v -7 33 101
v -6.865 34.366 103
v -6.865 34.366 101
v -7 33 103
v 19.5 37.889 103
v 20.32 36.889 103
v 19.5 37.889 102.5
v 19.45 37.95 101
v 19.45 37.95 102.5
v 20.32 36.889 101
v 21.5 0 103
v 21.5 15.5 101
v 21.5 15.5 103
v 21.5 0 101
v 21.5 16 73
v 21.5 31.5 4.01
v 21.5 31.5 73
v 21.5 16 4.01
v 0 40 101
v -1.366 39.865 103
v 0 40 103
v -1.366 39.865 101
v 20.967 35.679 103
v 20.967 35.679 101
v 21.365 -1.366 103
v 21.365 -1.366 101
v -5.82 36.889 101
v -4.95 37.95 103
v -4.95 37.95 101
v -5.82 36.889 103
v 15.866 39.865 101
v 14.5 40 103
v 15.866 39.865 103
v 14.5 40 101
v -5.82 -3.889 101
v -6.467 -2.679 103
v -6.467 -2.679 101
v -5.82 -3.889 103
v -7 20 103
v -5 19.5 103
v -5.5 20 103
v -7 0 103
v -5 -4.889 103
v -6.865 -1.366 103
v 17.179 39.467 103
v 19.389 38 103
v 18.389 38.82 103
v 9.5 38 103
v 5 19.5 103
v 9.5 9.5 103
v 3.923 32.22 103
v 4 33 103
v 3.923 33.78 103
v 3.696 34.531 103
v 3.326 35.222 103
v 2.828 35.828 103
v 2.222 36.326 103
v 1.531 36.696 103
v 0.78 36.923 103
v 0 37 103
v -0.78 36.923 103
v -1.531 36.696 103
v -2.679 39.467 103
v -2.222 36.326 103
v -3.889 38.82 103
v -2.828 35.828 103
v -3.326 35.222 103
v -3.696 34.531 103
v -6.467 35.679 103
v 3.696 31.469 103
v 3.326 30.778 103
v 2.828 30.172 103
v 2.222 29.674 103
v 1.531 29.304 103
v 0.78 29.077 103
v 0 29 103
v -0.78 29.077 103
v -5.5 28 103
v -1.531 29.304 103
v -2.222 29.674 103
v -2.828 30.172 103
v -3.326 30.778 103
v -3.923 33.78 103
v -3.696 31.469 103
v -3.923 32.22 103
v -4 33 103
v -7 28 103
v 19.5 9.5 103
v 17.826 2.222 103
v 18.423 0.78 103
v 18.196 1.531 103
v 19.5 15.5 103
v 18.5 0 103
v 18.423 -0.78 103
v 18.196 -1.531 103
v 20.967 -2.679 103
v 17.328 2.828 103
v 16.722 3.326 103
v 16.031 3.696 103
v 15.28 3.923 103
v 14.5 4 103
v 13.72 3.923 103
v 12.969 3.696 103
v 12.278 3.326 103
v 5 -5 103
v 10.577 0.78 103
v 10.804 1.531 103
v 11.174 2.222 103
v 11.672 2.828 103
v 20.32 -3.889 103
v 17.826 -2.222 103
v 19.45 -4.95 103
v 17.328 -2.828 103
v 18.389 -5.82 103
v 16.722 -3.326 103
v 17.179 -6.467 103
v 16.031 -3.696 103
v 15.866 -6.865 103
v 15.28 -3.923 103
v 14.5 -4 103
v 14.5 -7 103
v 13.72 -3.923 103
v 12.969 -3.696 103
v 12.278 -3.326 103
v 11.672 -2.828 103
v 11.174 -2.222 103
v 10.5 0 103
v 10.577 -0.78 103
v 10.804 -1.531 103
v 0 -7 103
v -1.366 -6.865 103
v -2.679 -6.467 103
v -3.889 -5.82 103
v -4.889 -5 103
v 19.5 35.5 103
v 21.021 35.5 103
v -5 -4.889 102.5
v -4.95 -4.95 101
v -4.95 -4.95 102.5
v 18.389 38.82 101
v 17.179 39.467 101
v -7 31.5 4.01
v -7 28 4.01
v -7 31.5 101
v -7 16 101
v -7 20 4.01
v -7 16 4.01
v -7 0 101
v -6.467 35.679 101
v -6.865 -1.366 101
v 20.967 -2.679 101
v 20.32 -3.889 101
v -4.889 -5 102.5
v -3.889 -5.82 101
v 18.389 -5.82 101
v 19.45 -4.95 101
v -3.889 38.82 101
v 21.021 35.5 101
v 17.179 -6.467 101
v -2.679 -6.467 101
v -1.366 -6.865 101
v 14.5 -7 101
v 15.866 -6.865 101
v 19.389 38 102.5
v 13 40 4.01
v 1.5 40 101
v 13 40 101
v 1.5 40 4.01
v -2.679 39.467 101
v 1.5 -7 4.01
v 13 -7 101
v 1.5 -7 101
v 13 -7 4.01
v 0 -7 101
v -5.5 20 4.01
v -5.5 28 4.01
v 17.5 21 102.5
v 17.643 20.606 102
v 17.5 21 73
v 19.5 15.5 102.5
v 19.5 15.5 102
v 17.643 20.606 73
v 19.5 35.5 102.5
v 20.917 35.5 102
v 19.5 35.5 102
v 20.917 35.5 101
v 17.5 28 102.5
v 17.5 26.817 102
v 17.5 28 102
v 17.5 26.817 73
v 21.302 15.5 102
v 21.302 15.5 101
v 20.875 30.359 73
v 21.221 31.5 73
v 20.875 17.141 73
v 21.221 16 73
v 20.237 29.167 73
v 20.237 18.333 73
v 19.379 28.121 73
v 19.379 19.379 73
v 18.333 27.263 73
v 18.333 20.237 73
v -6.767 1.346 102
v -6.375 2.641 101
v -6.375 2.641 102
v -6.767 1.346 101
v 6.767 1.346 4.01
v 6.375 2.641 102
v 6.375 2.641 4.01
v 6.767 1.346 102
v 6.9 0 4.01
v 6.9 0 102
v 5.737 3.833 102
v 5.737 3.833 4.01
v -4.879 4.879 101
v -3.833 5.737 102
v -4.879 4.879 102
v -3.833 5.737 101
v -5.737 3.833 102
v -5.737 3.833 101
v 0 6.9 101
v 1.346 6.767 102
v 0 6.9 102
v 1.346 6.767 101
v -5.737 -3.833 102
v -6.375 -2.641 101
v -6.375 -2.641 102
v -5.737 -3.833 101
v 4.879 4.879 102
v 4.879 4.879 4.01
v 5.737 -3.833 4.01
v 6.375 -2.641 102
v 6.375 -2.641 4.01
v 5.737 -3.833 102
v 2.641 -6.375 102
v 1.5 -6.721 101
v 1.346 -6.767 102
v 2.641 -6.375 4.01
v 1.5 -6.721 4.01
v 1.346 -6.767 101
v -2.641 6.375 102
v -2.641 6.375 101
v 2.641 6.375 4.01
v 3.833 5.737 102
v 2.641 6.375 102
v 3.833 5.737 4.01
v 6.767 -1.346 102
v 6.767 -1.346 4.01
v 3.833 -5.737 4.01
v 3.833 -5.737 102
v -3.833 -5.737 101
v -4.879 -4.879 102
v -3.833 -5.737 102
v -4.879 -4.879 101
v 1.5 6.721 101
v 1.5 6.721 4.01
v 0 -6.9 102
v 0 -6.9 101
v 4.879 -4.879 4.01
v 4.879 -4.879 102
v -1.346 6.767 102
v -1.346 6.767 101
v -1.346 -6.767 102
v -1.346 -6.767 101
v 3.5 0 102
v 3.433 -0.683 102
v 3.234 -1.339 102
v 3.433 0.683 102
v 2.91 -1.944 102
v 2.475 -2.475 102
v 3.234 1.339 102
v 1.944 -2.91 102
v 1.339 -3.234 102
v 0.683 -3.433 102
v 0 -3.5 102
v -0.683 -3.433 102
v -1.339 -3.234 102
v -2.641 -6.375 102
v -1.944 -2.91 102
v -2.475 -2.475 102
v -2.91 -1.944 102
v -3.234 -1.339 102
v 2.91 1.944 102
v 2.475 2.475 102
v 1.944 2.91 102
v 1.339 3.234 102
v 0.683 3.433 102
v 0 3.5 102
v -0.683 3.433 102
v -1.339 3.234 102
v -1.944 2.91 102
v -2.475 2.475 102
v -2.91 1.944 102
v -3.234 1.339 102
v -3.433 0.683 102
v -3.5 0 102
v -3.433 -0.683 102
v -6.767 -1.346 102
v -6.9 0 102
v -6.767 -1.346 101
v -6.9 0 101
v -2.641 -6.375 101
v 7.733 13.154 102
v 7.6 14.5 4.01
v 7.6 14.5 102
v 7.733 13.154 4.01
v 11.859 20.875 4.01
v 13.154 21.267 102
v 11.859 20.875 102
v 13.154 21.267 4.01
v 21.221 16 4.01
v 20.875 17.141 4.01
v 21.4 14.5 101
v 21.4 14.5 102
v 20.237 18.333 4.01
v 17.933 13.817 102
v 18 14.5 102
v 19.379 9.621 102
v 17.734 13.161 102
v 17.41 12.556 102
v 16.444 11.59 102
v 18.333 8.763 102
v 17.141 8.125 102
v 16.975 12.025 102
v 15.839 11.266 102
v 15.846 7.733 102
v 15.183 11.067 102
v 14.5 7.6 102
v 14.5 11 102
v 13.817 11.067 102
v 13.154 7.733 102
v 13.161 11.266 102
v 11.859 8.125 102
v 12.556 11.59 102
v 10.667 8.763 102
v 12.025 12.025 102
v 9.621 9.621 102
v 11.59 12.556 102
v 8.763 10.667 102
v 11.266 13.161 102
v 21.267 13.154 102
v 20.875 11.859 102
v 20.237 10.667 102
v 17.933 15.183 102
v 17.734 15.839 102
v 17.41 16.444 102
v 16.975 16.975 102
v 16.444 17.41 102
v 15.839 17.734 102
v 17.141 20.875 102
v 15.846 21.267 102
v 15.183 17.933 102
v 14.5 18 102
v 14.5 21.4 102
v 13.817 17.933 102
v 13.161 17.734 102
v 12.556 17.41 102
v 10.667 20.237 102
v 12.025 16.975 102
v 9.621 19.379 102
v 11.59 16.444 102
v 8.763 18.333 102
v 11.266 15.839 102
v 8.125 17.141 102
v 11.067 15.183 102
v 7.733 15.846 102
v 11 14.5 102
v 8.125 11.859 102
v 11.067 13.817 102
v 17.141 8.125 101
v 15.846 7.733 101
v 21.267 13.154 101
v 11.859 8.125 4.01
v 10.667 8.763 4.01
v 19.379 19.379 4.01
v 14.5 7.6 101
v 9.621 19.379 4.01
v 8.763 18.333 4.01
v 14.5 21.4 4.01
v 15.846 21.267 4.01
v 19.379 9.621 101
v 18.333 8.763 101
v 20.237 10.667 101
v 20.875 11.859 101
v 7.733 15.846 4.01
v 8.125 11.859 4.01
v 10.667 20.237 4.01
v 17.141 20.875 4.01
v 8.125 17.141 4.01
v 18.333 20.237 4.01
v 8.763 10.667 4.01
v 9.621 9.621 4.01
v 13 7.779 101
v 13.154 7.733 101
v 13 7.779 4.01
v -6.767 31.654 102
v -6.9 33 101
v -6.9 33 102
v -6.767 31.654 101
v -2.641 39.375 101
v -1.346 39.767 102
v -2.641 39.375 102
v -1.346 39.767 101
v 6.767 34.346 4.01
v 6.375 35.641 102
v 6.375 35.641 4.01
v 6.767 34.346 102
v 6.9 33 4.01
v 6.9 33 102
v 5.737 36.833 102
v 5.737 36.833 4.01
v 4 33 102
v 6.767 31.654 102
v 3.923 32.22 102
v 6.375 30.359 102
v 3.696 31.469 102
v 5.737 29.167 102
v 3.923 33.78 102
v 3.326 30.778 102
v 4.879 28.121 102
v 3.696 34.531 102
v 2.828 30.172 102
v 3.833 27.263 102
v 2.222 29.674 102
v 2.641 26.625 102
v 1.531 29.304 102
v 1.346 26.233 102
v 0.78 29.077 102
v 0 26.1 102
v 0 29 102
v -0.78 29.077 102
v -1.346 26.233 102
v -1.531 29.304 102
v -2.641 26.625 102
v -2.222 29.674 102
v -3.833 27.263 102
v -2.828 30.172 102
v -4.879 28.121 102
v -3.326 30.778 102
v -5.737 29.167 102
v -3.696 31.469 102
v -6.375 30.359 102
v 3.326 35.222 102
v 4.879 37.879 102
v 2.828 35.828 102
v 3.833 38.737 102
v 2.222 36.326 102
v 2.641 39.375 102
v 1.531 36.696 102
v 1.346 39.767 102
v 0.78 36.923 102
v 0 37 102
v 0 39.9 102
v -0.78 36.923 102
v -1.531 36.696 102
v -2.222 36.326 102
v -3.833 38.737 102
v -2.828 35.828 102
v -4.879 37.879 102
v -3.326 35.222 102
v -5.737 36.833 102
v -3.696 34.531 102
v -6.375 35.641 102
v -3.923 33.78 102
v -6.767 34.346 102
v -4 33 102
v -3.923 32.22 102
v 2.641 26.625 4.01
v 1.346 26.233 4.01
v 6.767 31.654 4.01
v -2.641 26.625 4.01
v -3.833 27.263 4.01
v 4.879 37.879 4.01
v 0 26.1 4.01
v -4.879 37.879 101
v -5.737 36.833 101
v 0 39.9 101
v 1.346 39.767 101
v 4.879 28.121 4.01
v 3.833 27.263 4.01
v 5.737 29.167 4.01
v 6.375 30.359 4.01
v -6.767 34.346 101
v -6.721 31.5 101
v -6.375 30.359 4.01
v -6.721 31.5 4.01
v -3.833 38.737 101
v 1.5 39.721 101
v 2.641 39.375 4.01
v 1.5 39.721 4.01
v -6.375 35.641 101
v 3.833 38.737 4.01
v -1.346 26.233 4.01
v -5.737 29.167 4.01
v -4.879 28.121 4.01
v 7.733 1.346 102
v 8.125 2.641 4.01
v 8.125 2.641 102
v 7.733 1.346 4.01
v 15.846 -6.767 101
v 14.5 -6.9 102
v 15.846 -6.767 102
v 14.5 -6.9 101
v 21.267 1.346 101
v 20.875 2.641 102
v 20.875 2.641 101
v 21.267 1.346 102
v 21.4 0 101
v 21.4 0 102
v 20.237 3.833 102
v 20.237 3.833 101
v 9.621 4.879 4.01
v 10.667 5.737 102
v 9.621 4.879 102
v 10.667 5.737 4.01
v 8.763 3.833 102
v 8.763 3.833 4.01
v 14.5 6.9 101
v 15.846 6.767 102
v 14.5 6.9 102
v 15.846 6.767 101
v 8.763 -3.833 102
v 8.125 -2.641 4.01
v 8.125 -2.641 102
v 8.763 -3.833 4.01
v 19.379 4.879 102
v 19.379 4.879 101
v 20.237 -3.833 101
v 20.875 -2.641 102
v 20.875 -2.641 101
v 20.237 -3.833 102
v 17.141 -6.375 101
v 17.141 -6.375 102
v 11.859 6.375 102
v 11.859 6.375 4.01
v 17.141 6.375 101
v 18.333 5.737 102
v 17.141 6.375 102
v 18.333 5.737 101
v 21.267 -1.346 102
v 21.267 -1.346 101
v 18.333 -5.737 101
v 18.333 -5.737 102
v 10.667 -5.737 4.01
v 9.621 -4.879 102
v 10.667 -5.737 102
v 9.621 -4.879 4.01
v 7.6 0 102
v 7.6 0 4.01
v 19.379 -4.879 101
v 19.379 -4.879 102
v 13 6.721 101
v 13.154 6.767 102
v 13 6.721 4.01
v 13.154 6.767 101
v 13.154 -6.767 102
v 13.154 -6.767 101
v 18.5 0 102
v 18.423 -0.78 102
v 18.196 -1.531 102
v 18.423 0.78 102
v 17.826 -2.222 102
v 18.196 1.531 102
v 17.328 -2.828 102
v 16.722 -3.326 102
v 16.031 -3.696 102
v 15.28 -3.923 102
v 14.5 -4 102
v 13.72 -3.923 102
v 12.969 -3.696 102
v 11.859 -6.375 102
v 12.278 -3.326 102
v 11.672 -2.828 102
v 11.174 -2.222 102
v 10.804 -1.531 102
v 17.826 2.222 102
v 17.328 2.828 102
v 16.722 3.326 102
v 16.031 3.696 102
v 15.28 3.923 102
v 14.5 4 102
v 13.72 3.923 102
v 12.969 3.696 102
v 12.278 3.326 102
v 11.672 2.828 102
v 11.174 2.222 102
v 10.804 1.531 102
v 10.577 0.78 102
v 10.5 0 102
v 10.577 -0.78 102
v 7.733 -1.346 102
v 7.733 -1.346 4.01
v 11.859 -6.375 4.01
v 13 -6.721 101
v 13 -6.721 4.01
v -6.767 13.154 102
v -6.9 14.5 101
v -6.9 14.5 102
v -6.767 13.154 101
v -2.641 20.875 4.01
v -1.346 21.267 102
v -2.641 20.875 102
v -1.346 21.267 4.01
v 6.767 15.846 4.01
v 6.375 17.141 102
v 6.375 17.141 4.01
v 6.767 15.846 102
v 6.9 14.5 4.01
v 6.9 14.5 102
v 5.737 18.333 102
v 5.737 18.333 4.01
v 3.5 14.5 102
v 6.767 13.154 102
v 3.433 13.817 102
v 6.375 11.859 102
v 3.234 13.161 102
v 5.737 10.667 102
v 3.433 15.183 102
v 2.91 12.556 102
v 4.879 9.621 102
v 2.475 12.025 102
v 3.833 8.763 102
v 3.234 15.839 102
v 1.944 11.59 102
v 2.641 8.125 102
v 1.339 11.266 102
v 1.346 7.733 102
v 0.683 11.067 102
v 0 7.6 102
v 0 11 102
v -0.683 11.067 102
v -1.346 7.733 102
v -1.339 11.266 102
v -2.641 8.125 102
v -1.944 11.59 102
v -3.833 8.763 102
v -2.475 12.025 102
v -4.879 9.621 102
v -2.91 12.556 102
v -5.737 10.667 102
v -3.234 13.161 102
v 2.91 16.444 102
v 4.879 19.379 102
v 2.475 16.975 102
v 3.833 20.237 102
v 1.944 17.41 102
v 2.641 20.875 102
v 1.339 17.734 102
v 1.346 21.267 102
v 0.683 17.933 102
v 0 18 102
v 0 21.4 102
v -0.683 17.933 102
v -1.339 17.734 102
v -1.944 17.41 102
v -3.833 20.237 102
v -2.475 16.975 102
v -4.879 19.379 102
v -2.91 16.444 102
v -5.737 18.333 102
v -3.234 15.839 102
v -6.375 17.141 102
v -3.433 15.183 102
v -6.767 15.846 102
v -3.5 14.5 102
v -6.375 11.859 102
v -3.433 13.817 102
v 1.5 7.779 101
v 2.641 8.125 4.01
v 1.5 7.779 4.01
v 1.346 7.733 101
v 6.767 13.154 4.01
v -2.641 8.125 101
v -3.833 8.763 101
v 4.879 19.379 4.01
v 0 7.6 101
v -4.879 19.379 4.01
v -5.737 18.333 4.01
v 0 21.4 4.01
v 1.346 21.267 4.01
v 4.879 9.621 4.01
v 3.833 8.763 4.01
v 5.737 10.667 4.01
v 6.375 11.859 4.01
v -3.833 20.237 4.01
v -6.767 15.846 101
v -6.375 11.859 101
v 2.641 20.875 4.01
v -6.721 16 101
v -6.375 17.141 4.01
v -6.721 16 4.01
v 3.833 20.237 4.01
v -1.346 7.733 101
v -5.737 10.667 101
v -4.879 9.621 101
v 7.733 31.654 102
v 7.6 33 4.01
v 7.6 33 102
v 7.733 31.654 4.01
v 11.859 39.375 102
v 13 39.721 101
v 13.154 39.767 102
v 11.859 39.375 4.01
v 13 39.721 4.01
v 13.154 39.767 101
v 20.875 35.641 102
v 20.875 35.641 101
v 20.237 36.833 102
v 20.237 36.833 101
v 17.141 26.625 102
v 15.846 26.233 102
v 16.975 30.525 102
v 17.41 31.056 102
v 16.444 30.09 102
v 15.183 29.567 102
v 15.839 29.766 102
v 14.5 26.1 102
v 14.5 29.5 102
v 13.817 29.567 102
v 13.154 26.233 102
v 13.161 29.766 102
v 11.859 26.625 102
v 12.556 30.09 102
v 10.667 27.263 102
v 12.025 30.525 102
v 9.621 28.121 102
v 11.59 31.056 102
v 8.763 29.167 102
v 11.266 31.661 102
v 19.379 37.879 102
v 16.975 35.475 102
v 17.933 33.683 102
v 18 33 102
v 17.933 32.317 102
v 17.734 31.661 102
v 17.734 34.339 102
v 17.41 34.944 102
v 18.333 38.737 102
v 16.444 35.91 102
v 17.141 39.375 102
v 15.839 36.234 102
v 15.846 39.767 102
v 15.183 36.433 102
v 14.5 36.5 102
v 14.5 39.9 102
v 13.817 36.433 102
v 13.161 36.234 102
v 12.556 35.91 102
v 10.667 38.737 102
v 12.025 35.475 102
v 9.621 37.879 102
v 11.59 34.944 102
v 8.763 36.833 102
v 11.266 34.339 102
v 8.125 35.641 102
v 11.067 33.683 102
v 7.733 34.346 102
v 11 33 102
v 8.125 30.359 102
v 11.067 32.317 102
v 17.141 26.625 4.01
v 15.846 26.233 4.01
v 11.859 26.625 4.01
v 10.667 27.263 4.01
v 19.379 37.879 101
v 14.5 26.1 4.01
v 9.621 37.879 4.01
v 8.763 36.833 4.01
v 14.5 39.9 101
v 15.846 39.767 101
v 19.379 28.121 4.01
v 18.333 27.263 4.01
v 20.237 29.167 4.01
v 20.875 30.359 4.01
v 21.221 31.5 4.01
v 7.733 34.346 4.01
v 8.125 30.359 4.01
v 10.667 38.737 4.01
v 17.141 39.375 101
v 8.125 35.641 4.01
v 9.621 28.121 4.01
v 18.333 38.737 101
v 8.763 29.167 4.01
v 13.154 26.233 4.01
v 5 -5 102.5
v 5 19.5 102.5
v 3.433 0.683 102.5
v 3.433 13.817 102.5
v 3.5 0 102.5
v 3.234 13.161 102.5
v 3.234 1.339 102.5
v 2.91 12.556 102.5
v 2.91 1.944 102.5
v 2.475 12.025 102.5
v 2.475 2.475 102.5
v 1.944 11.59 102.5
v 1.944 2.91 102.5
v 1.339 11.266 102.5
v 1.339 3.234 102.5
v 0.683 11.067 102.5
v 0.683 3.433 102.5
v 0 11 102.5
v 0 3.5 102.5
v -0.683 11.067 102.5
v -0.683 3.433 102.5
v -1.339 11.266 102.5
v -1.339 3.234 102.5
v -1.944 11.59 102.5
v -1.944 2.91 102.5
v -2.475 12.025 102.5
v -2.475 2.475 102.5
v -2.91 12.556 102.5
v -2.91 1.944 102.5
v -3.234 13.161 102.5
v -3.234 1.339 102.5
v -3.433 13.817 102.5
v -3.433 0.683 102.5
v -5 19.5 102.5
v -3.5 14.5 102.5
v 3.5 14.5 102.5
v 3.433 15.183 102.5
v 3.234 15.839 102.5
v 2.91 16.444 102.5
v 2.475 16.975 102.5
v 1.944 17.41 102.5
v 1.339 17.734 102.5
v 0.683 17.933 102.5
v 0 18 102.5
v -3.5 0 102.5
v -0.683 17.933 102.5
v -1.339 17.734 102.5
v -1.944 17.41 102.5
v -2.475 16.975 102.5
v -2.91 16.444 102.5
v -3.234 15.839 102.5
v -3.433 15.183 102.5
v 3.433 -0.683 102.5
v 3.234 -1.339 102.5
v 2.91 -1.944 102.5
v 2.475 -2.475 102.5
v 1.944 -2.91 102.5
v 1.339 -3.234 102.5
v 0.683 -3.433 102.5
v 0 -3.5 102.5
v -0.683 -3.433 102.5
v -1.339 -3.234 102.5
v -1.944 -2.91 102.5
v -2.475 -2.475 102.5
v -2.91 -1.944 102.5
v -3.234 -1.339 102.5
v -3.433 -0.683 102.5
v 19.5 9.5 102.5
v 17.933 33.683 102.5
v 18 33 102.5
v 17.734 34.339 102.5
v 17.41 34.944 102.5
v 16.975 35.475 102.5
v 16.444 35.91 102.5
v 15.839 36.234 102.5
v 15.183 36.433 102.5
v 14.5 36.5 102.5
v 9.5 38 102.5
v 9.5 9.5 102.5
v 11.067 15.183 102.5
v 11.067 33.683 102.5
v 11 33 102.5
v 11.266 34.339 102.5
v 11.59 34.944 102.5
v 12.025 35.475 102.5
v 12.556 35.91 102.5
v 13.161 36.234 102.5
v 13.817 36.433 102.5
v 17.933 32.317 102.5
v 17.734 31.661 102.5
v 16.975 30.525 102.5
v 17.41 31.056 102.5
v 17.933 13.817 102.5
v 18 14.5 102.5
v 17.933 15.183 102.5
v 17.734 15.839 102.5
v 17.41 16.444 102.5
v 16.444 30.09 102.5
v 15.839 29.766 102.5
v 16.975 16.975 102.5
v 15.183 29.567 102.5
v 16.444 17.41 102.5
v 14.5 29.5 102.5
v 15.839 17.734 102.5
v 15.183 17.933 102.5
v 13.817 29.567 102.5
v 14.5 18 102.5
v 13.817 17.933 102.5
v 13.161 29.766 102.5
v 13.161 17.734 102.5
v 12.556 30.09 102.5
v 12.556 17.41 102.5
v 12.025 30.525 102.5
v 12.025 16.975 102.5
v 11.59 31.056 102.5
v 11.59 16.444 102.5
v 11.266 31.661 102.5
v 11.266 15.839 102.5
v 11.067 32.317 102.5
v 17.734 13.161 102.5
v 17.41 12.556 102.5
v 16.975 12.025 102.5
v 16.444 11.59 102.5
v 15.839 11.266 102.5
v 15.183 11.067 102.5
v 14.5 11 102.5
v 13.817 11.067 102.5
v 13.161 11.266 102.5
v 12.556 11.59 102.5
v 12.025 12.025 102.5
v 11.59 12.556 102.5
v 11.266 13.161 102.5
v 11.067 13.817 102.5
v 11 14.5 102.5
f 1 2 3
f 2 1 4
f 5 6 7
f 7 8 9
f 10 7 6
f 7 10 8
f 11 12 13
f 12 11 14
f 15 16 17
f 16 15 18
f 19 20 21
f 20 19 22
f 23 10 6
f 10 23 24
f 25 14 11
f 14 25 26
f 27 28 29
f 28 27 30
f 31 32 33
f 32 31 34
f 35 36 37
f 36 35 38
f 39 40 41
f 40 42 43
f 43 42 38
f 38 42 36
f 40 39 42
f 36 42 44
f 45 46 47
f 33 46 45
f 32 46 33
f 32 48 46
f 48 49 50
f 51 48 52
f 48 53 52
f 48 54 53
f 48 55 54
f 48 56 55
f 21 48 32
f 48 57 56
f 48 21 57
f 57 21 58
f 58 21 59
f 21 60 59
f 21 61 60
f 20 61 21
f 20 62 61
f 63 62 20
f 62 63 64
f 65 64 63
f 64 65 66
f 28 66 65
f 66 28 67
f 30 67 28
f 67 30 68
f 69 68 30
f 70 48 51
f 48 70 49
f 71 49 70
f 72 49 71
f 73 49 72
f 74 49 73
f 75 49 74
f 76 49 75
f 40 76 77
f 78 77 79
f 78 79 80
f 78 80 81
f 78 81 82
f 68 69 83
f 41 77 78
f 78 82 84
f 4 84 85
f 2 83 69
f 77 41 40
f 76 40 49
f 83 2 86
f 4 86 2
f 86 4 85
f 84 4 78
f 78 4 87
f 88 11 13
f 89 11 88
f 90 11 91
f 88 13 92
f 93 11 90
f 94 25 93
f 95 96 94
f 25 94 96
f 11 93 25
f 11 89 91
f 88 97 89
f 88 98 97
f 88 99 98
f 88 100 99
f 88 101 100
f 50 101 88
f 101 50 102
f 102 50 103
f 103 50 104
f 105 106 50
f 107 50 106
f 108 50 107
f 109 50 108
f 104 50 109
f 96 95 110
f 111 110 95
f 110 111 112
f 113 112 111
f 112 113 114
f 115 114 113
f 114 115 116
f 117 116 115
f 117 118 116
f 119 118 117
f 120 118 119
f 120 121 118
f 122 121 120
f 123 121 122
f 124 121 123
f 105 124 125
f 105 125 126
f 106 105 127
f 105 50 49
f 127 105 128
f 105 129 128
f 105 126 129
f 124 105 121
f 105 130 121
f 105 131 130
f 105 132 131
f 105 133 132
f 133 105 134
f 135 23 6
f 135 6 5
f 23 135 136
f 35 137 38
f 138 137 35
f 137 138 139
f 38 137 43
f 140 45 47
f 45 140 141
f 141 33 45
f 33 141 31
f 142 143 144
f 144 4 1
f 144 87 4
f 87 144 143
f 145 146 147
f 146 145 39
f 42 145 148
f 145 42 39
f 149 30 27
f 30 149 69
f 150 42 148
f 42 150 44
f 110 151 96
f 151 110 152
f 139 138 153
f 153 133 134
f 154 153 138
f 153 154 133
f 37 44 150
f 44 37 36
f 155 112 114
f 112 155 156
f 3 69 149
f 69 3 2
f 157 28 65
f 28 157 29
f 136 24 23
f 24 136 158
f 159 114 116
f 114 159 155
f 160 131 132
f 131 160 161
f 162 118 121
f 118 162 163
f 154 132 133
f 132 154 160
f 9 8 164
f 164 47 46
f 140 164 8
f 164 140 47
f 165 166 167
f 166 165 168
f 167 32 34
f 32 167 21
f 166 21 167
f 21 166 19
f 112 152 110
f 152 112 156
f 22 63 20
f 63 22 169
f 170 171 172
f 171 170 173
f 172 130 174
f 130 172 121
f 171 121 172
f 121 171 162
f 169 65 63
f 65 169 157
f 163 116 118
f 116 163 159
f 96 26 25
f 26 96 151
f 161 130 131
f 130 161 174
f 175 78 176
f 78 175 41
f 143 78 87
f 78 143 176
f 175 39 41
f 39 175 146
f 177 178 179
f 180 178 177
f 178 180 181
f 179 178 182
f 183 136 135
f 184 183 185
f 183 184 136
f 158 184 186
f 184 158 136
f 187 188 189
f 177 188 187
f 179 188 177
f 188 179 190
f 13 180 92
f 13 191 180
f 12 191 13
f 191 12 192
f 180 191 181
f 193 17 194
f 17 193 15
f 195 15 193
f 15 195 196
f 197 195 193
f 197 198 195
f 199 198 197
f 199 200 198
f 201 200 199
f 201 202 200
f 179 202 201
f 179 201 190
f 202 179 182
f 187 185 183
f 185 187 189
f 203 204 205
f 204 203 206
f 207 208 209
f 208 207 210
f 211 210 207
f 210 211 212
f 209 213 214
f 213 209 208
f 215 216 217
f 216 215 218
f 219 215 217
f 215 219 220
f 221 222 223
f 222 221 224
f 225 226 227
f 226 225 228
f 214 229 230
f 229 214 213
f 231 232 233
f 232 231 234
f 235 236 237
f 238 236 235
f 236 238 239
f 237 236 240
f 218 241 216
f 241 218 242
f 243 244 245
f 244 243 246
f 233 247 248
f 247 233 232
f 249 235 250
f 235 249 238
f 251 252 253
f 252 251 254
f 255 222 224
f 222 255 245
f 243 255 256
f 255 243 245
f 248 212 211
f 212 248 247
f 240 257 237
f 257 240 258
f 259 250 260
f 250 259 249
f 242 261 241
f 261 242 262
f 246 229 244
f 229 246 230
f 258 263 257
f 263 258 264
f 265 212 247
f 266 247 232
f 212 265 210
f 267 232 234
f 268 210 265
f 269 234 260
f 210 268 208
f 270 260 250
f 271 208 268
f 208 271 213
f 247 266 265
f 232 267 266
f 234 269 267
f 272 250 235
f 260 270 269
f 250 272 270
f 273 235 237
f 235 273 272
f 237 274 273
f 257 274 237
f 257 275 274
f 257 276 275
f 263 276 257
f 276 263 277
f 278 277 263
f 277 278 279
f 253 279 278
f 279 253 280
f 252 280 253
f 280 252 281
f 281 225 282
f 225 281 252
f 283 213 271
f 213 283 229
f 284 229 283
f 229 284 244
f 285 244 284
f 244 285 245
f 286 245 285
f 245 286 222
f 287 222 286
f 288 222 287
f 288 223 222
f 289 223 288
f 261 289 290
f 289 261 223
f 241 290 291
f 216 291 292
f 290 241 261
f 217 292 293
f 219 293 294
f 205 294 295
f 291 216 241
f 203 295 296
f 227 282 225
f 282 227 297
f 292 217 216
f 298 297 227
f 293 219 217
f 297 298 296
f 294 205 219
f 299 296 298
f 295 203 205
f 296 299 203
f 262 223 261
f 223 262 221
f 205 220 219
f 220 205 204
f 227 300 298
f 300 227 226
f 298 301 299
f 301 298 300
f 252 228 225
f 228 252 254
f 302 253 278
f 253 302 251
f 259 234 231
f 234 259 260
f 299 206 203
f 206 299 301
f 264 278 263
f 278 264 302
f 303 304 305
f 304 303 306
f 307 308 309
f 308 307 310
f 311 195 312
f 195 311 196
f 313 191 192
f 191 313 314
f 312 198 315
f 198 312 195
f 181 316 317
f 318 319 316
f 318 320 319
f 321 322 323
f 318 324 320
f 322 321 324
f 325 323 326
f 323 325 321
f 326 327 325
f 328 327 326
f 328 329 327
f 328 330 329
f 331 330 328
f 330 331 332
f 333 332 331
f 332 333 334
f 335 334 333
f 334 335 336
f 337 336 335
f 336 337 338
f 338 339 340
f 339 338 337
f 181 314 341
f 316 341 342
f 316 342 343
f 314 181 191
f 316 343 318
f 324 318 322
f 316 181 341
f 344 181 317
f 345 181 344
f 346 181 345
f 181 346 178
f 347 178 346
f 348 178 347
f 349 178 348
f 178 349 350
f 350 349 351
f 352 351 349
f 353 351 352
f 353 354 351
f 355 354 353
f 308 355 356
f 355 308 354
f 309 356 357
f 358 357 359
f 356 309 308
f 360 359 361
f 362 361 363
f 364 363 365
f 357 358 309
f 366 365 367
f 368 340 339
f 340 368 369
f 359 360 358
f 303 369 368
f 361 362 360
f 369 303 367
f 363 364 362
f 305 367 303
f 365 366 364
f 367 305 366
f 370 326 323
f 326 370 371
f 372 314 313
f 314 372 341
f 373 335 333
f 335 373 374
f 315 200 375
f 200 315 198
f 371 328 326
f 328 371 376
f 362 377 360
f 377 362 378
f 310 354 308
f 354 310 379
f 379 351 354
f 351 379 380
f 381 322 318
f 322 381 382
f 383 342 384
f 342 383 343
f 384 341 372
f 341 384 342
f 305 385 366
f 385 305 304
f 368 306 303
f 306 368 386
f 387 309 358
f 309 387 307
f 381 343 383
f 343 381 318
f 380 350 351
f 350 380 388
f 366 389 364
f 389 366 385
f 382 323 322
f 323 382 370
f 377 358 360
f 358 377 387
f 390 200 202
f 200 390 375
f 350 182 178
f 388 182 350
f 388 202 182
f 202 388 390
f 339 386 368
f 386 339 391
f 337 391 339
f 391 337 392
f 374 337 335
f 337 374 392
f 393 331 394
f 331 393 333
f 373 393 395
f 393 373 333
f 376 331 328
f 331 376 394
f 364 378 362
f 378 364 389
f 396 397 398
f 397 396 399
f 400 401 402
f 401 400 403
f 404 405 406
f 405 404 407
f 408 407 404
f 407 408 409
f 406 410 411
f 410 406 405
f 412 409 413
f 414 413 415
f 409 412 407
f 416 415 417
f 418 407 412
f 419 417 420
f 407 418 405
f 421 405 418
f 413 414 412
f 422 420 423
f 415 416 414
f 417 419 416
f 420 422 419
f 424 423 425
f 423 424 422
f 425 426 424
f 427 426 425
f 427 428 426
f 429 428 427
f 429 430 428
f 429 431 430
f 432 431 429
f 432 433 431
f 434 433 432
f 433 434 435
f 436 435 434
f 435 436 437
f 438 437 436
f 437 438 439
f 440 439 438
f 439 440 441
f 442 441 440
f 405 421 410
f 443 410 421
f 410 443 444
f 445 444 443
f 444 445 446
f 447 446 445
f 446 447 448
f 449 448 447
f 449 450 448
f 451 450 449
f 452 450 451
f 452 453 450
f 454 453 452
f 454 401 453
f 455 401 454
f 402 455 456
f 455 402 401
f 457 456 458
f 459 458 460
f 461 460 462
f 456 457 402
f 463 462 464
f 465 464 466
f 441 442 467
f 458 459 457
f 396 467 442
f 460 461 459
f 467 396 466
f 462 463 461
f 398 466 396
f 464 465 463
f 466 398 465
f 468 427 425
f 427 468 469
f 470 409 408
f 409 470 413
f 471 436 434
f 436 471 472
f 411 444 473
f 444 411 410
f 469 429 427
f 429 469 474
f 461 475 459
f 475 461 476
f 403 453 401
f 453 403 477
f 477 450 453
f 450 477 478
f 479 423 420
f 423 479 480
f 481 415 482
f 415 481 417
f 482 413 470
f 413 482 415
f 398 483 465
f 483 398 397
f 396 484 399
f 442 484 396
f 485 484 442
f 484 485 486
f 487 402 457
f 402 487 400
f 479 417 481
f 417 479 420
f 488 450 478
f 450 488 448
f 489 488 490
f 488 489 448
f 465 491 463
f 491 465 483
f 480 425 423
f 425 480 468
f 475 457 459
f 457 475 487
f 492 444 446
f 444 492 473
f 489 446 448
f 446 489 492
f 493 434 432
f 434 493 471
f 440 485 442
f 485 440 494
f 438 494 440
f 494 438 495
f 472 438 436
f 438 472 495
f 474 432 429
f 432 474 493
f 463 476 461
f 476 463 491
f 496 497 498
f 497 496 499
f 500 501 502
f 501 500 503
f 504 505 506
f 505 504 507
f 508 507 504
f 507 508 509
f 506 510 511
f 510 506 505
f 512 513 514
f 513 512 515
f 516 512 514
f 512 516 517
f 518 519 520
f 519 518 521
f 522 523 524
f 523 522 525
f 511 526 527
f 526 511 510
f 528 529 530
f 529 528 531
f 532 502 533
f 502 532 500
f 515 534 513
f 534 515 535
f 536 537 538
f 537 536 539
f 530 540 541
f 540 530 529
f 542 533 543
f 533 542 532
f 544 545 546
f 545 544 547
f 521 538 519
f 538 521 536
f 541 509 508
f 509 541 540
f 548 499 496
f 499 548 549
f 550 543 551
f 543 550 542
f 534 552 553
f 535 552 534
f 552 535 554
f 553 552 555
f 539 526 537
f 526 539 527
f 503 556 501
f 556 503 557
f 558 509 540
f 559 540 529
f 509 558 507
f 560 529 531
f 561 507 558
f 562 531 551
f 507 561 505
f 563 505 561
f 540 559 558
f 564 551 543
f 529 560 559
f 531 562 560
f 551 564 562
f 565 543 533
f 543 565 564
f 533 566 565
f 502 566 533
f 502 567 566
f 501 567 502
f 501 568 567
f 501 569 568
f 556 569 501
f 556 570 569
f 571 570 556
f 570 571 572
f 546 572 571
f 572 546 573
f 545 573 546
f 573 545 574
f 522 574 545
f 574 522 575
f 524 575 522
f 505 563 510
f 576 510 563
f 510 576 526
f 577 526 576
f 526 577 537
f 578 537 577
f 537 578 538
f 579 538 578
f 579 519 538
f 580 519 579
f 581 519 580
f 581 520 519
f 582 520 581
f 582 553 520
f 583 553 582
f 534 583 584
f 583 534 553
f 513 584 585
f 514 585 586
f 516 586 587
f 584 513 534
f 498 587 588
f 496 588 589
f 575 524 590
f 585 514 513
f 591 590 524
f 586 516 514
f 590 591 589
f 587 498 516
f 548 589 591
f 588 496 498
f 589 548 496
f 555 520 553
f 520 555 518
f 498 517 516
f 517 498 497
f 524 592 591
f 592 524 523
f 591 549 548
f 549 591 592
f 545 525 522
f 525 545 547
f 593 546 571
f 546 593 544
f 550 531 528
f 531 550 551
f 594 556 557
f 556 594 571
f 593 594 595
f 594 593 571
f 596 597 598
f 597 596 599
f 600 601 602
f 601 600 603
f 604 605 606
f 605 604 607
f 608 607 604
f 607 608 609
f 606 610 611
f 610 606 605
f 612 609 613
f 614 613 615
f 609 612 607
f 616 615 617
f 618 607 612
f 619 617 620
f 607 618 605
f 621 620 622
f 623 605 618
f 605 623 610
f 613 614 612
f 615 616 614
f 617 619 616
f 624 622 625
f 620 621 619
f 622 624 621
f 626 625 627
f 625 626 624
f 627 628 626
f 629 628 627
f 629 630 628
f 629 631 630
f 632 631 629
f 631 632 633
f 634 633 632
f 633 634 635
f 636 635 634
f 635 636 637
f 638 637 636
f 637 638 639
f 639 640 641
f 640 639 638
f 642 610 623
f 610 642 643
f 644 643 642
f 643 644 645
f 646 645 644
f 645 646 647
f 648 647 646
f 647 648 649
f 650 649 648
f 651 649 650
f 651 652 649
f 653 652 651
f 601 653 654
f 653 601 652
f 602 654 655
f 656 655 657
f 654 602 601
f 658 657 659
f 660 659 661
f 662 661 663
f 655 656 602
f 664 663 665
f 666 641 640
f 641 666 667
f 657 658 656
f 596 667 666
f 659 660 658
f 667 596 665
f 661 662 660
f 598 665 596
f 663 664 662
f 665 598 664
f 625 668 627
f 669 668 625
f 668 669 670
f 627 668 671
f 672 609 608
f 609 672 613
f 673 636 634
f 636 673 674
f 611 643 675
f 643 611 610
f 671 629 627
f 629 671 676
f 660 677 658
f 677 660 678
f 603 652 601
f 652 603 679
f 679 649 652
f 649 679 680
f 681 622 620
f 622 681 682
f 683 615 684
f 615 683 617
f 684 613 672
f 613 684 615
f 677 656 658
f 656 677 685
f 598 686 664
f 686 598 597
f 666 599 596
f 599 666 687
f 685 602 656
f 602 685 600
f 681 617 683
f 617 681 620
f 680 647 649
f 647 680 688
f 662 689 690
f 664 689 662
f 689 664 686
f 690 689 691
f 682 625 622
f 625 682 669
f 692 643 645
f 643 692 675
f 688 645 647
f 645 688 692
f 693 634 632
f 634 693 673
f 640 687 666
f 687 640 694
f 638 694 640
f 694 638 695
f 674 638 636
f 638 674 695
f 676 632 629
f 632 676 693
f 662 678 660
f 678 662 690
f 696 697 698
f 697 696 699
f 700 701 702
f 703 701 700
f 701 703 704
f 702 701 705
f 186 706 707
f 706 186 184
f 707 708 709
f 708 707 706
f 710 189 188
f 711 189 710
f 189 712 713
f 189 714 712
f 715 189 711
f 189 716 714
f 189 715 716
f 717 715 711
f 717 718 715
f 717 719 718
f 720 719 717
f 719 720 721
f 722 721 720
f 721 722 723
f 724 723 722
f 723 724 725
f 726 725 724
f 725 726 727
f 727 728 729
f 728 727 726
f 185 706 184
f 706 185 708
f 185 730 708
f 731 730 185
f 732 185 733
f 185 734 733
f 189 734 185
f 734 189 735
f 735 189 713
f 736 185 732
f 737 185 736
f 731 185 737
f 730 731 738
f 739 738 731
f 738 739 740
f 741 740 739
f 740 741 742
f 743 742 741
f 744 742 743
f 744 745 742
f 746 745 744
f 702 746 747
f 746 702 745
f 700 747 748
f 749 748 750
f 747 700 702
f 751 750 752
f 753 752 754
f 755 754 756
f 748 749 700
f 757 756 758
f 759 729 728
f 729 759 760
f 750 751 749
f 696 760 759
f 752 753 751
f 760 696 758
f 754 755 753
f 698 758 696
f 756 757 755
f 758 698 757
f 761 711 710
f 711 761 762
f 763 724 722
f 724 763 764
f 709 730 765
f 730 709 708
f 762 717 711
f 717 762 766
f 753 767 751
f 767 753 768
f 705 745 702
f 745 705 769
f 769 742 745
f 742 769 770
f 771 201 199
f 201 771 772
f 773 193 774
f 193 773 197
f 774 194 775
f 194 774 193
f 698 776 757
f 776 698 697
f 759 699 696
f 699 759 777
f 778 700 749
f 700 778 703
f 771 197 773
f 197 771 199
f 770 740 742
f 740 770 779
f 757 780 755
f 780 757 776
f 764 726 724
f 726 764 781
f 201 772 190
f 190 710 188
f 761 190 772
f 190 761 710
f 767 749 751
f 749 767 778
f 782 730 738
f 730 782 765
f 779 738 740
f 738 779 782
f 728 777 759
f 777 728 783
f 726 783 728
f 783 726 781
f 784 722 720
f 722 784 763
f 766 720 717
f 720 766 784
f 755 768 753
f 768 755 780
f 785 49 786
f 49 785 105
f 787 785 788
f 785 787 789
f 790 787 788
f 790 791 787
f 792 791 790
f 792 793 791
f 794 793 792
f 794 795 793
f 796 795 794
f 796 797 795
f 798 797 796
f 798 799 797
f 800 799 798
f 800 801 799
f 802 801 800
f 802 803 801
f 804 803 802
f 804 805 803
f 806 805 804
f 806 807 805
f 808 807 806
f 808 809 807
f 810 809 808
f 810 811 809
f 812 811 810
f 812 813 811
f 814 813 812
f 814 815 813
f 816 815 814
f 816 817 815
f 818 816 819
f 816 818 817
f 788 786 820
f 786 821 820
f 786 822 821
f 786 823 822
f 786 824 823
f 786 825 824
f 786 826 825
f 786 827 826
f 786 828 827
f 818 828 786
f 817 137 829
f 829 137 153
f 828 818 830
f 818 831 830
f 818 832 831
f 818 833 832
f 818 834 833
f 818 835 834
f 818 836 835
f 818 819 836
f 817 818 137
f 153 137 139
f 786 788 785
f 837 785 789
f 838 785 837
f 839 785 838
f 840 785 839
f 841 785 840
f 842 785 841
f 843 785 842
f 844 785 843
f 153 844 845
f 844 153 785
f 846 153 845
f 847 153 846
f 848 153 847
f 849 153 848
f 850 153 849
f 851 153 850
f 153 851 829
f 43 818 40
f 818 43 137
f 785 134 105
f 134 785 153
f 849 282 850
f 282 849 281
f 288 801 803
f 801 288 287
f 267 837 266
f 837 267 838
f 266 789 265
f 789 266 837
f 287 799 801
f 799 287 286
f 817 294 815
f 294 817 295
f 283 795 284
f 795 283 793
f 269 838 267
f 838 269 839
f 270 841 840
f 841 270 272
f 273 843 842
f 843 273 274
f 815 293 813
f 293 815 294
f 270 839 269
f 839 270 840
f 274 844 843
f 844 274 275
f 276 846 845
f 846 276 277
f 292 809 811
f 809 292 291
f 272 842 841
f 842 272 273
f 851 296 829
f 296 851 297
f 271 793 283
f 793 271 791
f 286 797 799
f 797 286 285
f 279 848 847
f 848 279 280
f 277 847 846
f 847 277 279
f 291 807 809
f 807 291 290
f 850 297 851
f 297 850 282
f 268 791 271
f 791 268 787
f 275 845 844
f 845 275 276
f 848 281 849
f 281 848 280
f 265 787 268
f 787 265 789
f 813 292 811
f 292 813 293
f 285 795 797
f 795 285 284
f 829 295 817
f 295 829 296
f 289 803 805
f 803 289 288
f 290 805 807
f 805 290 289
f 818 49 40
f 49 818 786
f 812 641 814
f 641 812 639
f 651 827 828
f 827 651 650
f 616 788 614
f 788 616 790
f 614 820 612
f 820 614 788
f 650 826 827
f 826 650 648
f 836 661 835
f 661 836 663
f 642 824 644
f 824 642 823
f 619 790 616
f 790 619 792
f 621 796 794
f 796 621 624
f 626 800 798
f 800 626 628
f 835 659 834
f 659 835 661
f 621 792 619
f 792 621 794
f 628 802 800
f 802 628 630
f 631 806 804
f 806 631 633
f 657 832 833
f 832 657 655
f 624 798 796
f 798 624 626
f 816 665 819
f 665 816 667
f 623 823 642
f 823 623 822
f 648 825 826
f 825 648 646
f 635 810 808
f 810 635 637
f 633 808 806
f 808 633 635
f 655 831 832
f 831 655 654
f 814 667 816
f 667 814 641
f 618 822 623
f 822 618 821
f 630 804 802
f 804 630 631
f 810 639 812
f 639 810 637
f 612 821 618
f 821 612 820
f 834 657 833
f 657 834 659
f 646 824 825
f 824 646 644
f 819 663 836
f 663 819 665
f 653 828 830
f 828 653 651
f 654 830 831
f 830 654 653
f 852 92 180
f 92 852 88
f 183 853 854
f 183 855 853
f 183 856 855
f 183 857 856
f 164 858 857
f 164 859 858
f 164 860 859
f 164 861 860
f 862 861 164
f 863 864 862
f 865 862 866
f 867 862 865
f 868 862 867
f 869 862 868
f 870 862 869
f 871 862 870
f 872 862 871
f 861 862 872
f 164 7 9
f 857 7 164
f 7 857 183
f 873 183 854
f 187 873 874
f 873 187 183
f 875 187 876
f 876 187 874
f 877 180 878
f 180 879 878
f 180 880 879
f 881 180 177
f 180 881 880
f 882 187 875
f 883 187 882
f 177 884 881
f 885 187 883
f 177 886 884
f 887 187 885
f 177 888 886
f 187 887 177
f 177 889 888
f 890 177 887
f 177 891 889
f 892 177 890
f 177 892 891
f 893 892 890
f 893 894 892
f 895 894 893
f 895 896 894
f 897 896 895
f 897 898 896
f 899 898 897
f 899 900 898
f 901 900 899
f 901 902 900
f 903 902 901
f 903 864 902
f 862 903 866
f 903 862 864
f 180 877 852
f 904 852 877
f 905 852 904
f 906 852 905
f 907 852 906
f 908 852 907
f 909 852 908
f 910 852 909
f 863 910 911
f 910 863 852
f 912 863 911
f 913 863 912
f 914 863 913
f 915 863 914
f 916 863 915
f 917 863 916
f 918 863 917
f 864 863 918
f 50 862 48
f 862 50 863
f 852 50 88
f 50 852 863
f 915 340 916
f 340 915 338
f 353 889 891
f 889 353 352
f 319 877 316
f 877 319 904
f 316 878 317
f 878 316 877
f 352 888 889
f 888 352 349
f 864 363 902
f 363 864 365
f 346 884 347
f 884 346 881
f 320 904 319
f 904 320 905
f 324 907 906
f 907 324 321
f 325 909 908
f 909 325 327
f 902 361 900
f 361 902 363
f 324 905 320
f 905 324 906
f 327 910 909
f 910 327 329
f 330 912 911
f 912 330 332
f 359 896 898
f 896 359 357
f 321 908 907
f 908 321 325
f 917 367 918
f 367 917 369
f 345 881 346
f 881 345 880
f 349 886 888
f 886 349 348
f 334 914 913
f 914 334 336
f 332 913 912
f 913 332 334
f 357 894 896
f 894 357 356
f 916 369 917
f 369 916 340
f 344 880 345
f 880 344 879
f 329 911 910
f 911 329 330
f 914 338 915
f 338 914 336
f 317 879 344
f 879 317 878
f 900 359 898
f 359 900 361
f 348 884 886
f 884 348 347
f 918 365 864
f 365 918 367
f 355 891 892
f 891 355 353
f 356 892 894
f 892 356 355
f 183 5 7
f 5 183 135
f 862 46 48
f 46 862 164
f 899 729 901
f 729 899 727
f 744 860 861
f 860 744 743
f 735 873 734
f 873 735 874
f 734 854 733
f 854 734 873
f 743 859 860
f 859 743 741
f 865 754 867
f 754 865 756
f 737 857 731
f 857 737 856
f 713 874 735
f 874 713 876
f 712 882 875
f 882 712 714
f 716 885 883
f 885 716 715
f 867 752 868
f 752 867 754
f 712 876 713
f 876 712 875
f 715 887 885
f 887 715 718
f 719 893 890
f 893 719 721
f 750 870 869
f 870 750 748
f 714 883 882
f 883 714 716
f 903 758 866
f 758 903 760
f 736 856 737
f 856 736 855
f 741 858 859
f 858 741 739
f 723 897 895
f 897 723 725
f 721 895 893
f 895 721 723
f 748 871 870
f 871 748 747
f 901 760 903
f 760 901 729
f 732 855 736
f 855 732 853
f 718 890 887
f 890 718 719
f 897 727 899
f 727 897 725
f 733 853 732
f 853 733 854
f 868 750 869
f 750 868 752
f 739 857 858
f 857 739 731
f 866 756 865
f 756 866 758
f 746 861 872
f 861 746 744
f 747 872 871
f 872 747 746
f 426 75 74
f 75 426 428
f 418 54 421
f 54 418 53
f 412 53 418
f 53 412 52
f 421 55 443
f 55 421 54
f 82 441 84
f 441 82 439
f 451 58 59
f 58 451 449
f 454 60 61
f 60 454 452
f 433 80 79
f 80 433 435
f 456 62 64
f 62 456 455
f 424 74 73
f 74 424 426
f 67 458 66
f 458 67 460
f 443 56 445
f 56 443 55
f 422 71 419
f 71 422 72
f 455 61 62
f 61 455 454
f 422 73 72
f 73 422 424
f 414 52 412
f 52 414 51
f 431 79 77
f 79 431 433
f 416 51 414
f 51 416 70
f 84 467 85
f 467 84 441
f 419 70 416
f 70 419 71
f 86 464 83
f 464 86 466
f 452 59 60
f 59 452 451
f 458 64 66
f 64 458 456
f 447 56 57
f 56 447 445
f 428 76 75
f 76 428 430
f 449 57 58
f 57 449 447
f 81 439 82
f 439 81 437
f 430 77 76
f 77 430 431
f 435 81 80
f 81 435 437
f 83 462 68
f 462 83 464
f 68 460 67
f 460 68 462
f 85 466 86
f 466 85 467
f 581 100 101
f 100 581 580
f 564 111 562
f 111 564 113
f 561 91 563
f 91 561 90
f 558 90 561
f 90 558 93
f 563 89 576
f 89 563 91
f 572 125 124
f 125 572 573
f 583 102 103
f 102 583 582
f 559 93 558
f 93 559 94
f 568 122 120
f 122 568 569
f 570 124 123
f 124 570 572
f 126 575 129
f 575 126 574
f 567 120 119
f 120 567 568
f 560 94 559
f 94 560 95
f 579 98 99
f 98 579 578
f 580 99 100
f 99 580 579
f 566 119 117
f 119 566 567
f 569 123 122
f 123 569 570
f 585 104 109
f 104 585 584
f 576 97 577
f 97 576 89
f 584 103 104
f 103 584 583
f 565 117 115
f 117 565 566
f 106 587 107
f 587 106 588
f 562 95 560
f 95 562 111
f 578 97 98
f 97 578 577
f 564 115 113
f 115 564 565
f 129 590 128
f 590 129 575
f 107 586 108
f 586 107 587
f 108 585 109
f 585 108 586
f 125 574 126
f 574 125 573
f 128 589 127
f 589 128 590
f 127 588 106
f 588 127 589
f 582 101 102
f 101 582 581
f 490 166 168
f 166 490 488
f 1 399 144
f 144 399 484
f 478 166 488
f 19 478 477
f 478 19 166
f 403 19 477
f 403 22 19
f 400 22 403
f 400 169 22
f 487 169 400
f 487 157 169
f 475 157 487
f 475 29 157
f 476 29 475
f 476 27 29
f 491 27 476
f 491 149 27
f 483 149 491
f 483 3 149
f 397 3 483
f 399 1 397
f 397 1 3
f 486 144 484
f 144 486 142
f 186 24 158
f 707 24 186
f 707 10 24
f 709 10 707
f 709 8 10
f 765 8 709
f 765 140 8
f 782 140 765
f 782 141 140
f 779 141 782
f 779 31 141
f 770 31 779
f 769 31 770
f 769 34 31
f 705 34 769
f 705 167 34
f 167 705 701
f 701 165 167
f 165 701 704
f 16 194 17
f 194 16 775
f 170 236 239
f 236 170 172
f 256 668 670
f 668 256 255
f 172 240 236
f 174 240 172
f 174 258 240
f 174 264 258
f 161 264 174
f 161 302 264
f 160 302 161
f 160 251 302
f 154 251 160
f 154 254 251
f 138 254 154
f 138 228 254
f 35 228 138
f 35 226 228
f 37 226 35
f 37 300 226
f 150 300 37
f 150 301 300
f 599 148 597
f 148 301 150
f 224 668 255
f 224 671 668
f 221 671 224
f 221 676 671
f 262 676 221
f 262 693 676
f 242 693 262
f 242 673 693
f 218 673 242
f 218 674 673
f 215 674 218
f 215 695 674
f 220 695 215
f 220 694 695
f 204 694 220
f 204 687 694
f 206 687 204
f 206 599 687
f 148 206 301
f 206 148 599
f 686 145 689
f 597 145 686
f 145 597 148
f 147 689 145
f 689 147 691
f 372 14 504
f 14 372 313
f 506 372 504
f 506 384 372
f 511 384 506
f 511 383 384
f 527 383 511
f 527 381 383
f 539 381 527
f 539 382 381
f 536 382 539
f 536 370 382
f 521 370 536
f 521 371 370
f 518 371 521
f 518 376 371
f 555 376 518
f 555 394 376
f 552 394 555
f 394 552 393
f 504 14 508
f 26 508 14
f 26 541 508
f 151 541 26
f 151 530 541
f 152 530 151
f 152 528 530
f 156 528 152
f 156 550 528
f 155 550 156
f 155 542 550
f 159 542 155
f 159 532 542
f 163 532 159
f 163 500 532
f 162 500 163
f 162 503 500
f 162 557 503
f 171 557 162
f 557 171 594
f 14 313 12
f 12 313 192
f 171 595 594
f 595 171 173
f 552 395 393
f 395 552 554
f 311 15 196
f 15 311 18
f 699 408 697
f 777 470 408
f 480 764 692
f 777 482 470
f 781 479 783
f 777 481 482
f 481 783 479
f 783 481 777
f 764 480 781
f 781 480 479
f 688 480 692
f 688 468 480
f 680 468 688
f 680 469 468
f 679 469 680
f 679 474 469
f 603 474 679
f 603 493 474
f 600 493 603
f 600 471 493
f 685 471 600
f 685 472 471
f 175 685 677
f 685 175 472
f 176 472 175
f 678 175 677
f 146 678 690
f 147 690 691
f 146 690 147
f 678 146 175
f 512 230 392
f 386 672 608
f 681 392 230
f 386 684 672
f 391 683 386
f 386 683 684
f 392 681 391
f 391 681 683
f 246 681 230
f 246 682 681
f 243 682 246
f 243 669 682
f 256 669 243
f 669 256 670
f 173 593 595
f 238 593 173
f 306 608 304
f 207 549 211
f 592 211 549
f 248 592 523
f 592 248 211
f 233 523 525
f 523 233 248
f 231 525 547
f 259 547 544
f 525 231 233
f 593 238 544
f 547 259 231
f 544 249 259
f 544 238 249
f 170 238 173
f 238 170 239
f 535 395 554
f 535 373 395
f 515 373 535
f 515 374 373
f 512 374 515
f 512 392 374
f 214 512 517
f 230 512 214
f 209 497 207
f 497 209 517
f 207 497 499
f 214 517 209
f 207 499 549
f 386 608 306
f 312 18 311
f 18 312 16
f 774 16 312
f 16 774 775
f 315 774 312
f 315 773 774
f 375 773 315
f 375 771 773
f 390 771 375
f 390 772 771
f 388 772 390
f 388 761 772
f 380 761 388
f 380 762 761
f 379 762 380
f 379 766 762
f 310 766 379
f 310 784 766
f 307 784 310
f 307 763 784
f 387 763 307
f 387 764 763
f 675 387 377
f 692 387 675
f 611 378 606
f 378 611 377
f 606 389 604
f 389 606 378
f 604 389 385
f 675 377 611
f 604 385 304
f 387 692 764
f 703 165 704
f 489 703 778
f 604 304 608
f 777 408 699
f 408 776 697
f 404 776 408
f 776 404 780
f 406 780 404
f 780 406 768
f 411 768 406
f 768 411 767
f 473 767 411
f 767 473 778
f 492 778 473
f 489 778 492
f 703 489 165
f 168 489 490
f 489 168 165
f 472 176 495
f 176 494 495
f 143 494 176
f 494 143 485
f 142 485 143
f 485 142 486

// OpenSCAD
// The actual AA batteries I have are about 50 x 13.5; Wikipedia specifies
// 50.5 x 14.5 as maximum dimensions, but the original magazine (and presumably
// therefore the contacts in the Battery Pack MA) is spaced for 14.5 mm between
// centers so an actual 14.5mm battery wouldn't fit without interference.

battery_length_mm = 50.5;
battery_diameter_mm = 13.8;

battery_spacing_small_mm = 14.5;
battery_spacing_large_mm = 18.5;

$fn = 32;

module battery() {
    cylinder(d = battery_diameter_mm, h = battery_length_mm - 1);
    translate([0, 0, battery_length_mm - 1]) cylinder(d = 4, h = 1);
}

module batteries() {
    for(z = [0, battery_length_mm]) {
        translate([0, 0, z]) {
            /*
            for(xy = [[0, 0], [battery_spacing_small_mm, battery_spacing_small_mm], [0, battery_spacing_small_mm + battery_spacing_large_mm]]) {
                translate([xy[0], xy[1], 0]) {
                    cylinder(d = battery_diameter_mm, h = battery_length_mm - 1);
                    translate([0, 0, battery_length_mm - 1]) cylinder(d = 4, h = 1);
                }
            }
            for(xy = [[battery_spacing_small_mm, 0], [0, battery_spacing_small_mm], [battery_spacing_small_mm, battery_spacing_small_mm + battery_spacing_large_mm]]) {
                translate([xy[0], xy[1], -2.5]) {
                    translate([0, 0, 1]) cylinder(d = battery_diameter_mm, h = battery_length_mm - 1);
                    cylinder(d = 4, h = 1);
                }
            }
            */
            for(xyzt = [
                [0, 0, 0.3, 0],
                [0, battery_spacing_small_mm, 0.3, 180],
                [0, battery_spacing_small_mm + battery_spacing_large_mm, 0.3, 0],
                [battery_spacing_small_mm, 0, 0.3, 180],
                [battery_spacing_small_mm, battery_spacing_small_mm, 0.3, 0],
                [battery_spacing_small_mm, battery_spacing_small_mm + battery_spacing_large_mm, 0.3, 180]
            ]) {
                translate([xyzt[0], xyzt[1], xyzt[2]])
                    translate([0, 0, battery_length_mm/2])
                    rotate([xyzt[3], 0, 0])
                    translate([0, 0, -battery_length_mm/2])
                    battery();
            }          
        }
    }
}

module battery_envelope() {
    for(xy = [[0, 0], [battery_spacing_small_mm, battery_spacing_small_mm], [0, battery_spacing_small_mm + battery_spacing_large_mm]]) {
        translate([xy[0], xy[1], 0]) {
            cylinder(d = battery_diameter_mm, h = battery_length_mm * 2);
        }
    }
    for(xy = [[battery_spacing_small_mm, 0], [0, battery_spacing_small_mm], [battery_spacing_small_mm, battery_spacing_small_mm + battery_spacing_large_mm]]) {
        translate([xy[0], xy[1], 0]) {
            cylinder(d = battery_diameter_mm, h = battery_length_mm * 2);

        }
    }
}

module env_cylinders(r, h) {
    hull() {
        cylinder(r = r, h = h);
        translate([battery_spacing_small_mm, 0]) cylinder(r = r, h = h);
        translate([0, battery_spacing_small_mm + battery_spacing_large_mm, 0]) cylinder(r = r, h = h);
        translate([battery_spacing_small_mm, battery_spacing_small_mm + battery_spacing_large_mm, 0]) cylinder(r = r, h = h);
    }
}

// reference plane in Z is the end of the Battery Pack MA
module envelope() {
    difference() {
        union() {
            env_cylinders(7, 103);
            env_cylinders(8, 4);
            translate([0, 0, -2.5]) env_cylinders(9, 2.5);
        }
        
        translate([-7 - 0.1, battery_spacing_small_mm + battery_spacing_large_mm - 5 - 8, 4]) cube([1.6, 8, 100]);
        
        hull() {
            translate([17.5, 21, 103 - 30]) cube([4.1, 7, 100]);
            // was y = 19.5, 10 originally, modified to avoid small towers
            translate([19.5, 15.5, 103 - 30]) cube([2.1, 20, 100]);
        }
    }
}


module contact_flat() {
    color("#ff9999") {
        translate([-4.5, -4.5, 0]) cube([9, 9, 0.3]);
        cylinder(d1 = 6, d2 = 3, h = 1.5);
    }
}


module contact_spring() {
    color("#999999") {
        translate([-4.5, -4.5, 0]) cube([9, 9, 0.3]);
        cylinder(d1 = 6, d2 = 4, h = 4);
    }
}


module contact_envelope(x_stretch = 0, y_stretch = 0) {
    translate([-5, -5 - y_stretch, -0.01]) cube([10 + x_stretch, 10 + y_stretch, 0.51]);
    cylinder(d = 7, h = 10);
}

//color("#f77") batteries();

intersection() {
    difference() {
        envelope();
        translate([0, 0, 1]) battery_envelope();
        translate([0, battery_spacing_small_mm + battery_spacing_large_mm, 50]) cylinder(d = 8, h = 100);
        translate([battery_spacing_small_mm, 0, 50]) cylinder(d = 8, h = 100);
        translate([-20, battery_spacing_small_mm + battery_spacing_large_mm - 1.5, 4]) cube([21.5, 40, 97]);
        translate([13, battery_spacing_small_mm + battery_spacing_large_mm - 1.5, 4]) cube([21.5, 40, 97]);
        translate([-20, -15, 4]) cube([21.5, 31, 97]);
        translate([13, -15, 4]) cube([21, 31, 97]);
        translate([0, 0, 103]) rotate([180, 0, 0]) contact_envelope(y_stretch = 10);
        translate([0, battery_spacing_small_mm, 103]) rotate([180, 0, 0]) contact_envelope();
        translate([battery_spacing_small_mm, battery_spacing_small_mm, 103]) rotate([180, 0, 0]) contact_envelope(y_stretch = 10);
        translate([battery_spacing_small_mm, battery_spacing_small_mm + battery_spacing_large_mm, 103]) rotate([180, 0, 0]) contact_envelope();
    }
    translate([-50, -50, 4.01]) cube([100, 100, 100]);
}

/*
translate([0, 0, 102.8]) rotate([180, 0, 0]) contact_flat();
translate([0, battery_spacing_small_mm, 102.8]) rotate([180, 0, 0]) contact_flat();
translate([battery_spacing_small_mm, battery_spacing_small_mm, 102.8]) rotate([180, 0, 0]) contact_flat();
translate([battery_spacing_small_mm, battery_spacing_small_mm + battery_spacing_large_mm, 102.8]) rotate([180, 0, 0]) contact_flat();
*/
